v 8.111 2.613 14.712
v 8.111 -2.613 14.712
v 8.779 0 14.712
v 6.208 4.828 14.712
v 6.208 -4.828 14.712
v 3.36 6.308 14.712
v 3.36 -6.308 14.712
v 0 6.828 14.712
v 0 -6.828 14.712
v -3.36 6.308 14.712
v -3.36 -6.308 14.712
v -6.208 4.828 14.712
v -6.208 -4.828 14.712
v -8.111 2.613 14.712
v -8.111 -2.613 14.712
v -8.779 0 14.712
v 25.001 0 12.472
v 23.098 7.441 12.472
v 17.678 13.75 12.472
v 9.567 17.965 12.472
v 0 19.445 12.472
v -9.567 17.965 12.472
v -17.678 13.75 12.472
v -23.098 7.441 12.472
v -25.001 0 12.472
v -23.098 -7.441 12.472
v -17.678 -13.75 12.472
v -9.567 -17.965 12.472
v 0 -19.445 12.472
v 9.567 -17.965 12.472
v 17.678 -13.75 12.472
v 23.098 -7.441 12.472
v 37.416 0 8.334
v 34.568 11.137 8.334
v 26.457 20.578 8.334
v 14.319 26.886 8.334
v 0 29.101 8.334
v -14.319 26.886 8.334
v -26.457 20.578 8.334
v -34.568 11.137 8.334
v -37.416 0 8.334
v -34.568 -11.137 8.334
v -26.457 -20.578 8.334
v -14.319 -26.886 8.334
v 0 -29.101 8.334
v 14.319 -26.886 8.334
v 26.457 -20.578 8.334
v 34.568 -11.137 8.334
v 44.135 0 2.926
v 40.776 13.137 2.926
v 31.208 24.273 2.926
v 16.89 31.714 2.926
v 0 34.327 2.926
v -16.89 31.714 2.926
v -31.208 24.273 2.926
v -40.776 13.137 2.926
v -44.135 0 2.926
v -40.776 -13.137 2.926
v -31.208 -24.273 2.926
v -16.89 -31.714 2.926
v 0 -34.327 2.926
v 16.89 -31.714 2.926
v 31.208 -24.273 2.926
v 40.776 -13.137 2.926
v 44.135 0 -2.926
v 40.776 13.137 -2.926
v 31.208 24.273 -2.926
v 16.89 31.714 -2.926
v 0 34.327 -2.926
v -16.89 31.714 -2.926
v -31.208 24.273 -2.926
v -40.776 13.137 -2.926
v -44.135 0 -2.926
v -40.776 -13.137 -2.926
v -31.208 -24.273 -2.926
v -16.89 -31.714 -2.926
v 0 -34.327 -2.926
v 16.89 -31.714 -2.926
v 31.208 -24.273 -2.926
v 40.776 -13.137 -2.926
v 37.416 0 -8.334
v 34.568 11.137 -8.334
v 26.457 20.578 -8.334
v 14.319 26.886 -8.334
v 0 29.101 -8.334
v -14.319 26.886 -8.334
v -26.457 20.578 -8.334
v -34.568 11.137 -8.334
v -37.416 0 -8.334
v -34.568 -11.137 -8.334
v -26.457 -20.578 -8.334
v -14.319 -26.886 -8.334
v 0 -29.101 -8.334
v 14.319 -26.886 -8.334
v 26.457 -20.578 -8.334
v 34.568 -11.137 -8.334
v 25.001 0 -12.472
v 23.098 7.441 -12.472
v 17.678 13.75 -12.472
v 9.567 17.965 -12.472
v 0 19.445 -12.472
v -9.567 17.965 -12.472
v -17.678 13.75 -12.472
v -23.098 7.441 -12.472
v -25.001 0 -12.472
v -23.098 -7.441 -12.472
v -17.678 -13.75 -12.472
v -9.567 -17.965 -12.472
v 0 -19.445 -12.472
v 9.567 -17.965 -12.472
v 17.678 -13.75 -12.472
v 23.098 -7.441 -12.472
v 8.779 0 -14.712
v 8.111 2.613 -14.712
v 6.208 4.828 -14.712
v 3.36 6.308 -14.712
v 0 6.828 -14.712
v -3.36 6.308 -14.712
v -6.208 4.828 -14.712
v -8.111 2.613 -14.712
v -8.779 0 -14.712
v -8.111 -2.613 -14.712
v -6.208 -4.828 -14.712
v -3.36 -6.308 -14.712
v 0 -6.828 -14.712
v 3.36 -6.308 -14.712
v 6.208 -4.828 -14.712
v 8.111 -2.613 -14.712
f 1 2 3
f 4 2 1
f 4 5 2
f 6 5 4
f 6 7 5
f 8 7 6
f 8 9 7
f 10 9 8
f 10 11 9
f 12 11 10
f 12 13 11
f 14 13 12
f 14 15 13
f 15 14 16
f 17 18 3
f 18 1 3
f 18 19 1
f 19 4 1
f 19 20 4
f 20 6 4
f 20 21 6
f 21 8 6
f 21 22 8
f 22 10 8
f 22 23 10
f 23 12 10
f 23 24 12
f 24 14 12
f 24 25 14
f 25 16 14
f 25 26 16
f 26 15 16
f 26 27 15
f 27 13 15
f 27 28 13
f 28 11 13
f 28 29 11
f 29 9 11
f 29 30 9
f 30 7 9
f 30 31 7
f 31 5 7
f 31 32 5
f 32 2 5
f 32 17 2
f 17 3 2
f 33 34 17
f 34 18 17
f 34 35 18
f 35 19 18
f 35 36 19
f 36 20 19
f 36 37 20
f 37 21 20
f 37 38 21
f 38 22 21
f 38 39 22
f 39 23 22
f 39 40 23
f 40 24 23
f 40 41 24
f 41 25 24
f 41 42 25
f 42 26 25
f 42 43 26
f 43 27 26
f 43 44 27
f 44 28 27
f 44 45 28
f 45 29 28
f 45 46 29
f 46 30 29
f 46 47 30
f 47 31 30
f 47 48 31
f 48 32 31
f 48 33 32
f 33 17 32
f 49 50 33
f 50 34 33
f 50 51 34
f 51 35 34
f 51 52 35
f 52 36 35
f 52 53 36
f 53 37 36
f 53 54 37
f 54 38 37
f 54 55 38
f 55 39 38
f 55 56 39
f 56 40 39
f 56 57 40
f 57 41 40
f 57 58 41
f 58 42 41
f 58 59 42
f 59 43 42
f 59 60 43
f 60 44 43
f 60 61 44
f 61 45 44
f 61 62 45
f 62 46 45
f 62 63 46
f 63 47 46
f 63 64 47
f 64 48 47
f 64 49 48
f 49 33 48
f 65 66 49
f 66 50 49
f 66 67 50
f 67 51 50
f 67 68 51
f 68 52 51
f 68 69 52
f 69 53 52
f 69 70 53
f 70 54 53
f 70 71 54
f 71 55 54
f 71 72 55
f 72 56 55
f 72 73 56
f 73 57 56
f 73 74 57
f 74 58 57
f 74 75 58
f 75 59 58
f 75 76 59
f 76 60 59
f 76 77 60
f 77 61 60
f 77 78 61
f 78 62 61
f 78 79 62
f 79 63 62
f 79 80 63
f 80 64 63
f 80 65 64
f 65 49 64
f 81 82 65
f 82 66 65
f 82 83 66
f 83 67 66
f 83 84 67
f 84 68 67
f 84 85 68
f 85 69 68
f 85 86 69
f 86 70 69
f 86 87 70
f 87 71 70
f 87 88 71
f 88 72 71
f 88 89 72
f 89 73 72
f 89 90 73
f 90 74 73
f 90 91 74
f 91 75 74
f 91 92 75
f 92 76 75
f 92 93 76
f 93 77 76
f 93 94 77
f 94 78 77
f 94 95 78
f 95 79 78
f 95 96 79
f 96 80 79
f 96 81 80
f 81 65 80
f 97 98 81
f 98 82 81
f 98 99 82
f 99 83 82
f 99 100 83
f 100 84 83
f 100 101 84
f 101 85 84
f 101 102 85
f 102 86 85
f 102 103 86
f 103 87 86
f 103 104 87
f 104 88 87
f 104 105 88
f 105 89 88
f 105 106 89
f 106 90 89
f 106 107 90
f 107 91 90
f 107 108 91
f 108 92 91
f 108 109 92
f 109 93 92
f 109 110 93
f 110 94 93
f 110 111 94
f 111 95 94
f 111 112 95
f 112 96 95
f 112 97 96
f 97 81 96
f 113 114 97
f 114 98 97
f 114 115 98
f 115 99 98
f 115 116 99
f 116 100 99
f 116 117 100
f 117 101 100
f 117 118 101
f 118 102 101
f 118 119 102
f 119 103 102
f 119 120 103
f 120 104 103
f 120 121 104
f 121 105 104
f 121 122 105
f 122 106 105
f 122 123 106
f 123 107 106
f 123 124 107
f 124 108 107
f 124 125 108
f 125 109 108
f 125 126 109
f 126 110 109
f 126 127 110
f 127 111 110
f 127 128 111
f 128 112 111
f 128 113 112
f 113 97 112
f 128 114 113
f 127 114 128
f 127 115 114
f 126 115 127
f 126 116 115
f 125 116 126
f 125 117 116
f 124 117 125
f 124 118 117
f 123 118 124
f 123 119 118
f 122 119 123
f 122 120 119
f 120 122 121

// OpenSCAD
// Generated by SolidPython 1.0.1 on 2020-07-29 00:46:48


scale(v = [9, 7, 3]) {
	sphere(r = 5);
}
/***********************************************
*********      SolidPython code:      **********
************************************************
 
# import packages: SolidPython
from solid import *
from solid.utils import *
from itertools import chain, combinations, permutations


class Resize:

    def __init__(self, scad_file):
        self.scad_file = scad_file
        #self.scad_file = import_scad(scad_file)
        # cone/cylinder param:
        self.r1 = 0
        self.r2 = 0
        self.h = 0
        # rectangular prism param:
        self.w = 0
        self.l = 0
        # ellipse param:
        self.r = 0

    # import OpenScad code (file name corresponds to shape)


    # classify shape + parameters
    def assign(self, param1, param2, param3):
        if self.scad_file == 'cone.scad':
            self.r1 = param1
            self.r2 = param2
            self.h = param3
        elif self.scad_file == 'cylinder.scad':
            self.r1 = param1
            self.r2 = param2
            self.h = param3
        elif self.scad_file == 'rectangularPrism.scad':
            self.h = param1
            self.l = param2
            self.w = param3
        else:
            self.r = param1
            self.h = param2

    # resize parameters
    def iterate(self):
        x = range(3, 20, 2)
        i = 1
        if self.scad_file == 'cone.scad':
            tempList = list(permutations(x, 2))
            for temp in tempList:
                param1 = temp[0]
                param2 = temp[1]
                filepath = 'produced_scad_files/' + 'cone' + str(param1) + '_' + str(param2) + '_' + '.scad'
                scad_render_to_file(cylinder(h=param1, r1=param2, r2=0), filepath)

        elif self.scad_file == 'cylinder.scad':
            tempList = list(permutations(x, 3))
            for temp in tempList:
                param1 = temp[0]
                param2 = temp[1]
                filepath = 'produced_scad_files/' + 'cylinder' + str(param1) + '_' + str(param2) + '_' + '.scad'
                scad_render_to_file(cylinder(h=param1, r1=param2, r2=param2), filepath)

        elif self.scad_file == 'rectangularPrism.scad':
            tempList = list(permutations(x, 3))
            for temp in tempList:
                param1 = temp[0]
                param2 = temp[1]
                param3 = temp[2]
                filepath = 'produced_scad_files/' + 'rectangularPrism' + str(param1) + '_' + str(param2) + '_' + str(
                    param3) + '.scad'
                scad_render_to_file(cube(size=(param1, param2, param3)), filepath)

        elif self.scad_file == 'ellipse.scad':
            tempList = list(permutations(x, 4))
            for temp in tempList:
                param1 = temp[0]
                param2 = temp[1]
                param3 = temp[2]
                param4 = temp[3]
                filepath = 'produced_scad_files/' + 'ellipse' + str(param1) + '_' + str(param2) + '_' + str(param3) + '_' + str(param4) + '.scad'
                scad_render_to_file(scale([param1, param2, param3])(sphere(r=param4)), filepath)

    def render_to_scadfile(self):
        scad_render_to_file(scad, 'example.scad') 
 
************************************************/
